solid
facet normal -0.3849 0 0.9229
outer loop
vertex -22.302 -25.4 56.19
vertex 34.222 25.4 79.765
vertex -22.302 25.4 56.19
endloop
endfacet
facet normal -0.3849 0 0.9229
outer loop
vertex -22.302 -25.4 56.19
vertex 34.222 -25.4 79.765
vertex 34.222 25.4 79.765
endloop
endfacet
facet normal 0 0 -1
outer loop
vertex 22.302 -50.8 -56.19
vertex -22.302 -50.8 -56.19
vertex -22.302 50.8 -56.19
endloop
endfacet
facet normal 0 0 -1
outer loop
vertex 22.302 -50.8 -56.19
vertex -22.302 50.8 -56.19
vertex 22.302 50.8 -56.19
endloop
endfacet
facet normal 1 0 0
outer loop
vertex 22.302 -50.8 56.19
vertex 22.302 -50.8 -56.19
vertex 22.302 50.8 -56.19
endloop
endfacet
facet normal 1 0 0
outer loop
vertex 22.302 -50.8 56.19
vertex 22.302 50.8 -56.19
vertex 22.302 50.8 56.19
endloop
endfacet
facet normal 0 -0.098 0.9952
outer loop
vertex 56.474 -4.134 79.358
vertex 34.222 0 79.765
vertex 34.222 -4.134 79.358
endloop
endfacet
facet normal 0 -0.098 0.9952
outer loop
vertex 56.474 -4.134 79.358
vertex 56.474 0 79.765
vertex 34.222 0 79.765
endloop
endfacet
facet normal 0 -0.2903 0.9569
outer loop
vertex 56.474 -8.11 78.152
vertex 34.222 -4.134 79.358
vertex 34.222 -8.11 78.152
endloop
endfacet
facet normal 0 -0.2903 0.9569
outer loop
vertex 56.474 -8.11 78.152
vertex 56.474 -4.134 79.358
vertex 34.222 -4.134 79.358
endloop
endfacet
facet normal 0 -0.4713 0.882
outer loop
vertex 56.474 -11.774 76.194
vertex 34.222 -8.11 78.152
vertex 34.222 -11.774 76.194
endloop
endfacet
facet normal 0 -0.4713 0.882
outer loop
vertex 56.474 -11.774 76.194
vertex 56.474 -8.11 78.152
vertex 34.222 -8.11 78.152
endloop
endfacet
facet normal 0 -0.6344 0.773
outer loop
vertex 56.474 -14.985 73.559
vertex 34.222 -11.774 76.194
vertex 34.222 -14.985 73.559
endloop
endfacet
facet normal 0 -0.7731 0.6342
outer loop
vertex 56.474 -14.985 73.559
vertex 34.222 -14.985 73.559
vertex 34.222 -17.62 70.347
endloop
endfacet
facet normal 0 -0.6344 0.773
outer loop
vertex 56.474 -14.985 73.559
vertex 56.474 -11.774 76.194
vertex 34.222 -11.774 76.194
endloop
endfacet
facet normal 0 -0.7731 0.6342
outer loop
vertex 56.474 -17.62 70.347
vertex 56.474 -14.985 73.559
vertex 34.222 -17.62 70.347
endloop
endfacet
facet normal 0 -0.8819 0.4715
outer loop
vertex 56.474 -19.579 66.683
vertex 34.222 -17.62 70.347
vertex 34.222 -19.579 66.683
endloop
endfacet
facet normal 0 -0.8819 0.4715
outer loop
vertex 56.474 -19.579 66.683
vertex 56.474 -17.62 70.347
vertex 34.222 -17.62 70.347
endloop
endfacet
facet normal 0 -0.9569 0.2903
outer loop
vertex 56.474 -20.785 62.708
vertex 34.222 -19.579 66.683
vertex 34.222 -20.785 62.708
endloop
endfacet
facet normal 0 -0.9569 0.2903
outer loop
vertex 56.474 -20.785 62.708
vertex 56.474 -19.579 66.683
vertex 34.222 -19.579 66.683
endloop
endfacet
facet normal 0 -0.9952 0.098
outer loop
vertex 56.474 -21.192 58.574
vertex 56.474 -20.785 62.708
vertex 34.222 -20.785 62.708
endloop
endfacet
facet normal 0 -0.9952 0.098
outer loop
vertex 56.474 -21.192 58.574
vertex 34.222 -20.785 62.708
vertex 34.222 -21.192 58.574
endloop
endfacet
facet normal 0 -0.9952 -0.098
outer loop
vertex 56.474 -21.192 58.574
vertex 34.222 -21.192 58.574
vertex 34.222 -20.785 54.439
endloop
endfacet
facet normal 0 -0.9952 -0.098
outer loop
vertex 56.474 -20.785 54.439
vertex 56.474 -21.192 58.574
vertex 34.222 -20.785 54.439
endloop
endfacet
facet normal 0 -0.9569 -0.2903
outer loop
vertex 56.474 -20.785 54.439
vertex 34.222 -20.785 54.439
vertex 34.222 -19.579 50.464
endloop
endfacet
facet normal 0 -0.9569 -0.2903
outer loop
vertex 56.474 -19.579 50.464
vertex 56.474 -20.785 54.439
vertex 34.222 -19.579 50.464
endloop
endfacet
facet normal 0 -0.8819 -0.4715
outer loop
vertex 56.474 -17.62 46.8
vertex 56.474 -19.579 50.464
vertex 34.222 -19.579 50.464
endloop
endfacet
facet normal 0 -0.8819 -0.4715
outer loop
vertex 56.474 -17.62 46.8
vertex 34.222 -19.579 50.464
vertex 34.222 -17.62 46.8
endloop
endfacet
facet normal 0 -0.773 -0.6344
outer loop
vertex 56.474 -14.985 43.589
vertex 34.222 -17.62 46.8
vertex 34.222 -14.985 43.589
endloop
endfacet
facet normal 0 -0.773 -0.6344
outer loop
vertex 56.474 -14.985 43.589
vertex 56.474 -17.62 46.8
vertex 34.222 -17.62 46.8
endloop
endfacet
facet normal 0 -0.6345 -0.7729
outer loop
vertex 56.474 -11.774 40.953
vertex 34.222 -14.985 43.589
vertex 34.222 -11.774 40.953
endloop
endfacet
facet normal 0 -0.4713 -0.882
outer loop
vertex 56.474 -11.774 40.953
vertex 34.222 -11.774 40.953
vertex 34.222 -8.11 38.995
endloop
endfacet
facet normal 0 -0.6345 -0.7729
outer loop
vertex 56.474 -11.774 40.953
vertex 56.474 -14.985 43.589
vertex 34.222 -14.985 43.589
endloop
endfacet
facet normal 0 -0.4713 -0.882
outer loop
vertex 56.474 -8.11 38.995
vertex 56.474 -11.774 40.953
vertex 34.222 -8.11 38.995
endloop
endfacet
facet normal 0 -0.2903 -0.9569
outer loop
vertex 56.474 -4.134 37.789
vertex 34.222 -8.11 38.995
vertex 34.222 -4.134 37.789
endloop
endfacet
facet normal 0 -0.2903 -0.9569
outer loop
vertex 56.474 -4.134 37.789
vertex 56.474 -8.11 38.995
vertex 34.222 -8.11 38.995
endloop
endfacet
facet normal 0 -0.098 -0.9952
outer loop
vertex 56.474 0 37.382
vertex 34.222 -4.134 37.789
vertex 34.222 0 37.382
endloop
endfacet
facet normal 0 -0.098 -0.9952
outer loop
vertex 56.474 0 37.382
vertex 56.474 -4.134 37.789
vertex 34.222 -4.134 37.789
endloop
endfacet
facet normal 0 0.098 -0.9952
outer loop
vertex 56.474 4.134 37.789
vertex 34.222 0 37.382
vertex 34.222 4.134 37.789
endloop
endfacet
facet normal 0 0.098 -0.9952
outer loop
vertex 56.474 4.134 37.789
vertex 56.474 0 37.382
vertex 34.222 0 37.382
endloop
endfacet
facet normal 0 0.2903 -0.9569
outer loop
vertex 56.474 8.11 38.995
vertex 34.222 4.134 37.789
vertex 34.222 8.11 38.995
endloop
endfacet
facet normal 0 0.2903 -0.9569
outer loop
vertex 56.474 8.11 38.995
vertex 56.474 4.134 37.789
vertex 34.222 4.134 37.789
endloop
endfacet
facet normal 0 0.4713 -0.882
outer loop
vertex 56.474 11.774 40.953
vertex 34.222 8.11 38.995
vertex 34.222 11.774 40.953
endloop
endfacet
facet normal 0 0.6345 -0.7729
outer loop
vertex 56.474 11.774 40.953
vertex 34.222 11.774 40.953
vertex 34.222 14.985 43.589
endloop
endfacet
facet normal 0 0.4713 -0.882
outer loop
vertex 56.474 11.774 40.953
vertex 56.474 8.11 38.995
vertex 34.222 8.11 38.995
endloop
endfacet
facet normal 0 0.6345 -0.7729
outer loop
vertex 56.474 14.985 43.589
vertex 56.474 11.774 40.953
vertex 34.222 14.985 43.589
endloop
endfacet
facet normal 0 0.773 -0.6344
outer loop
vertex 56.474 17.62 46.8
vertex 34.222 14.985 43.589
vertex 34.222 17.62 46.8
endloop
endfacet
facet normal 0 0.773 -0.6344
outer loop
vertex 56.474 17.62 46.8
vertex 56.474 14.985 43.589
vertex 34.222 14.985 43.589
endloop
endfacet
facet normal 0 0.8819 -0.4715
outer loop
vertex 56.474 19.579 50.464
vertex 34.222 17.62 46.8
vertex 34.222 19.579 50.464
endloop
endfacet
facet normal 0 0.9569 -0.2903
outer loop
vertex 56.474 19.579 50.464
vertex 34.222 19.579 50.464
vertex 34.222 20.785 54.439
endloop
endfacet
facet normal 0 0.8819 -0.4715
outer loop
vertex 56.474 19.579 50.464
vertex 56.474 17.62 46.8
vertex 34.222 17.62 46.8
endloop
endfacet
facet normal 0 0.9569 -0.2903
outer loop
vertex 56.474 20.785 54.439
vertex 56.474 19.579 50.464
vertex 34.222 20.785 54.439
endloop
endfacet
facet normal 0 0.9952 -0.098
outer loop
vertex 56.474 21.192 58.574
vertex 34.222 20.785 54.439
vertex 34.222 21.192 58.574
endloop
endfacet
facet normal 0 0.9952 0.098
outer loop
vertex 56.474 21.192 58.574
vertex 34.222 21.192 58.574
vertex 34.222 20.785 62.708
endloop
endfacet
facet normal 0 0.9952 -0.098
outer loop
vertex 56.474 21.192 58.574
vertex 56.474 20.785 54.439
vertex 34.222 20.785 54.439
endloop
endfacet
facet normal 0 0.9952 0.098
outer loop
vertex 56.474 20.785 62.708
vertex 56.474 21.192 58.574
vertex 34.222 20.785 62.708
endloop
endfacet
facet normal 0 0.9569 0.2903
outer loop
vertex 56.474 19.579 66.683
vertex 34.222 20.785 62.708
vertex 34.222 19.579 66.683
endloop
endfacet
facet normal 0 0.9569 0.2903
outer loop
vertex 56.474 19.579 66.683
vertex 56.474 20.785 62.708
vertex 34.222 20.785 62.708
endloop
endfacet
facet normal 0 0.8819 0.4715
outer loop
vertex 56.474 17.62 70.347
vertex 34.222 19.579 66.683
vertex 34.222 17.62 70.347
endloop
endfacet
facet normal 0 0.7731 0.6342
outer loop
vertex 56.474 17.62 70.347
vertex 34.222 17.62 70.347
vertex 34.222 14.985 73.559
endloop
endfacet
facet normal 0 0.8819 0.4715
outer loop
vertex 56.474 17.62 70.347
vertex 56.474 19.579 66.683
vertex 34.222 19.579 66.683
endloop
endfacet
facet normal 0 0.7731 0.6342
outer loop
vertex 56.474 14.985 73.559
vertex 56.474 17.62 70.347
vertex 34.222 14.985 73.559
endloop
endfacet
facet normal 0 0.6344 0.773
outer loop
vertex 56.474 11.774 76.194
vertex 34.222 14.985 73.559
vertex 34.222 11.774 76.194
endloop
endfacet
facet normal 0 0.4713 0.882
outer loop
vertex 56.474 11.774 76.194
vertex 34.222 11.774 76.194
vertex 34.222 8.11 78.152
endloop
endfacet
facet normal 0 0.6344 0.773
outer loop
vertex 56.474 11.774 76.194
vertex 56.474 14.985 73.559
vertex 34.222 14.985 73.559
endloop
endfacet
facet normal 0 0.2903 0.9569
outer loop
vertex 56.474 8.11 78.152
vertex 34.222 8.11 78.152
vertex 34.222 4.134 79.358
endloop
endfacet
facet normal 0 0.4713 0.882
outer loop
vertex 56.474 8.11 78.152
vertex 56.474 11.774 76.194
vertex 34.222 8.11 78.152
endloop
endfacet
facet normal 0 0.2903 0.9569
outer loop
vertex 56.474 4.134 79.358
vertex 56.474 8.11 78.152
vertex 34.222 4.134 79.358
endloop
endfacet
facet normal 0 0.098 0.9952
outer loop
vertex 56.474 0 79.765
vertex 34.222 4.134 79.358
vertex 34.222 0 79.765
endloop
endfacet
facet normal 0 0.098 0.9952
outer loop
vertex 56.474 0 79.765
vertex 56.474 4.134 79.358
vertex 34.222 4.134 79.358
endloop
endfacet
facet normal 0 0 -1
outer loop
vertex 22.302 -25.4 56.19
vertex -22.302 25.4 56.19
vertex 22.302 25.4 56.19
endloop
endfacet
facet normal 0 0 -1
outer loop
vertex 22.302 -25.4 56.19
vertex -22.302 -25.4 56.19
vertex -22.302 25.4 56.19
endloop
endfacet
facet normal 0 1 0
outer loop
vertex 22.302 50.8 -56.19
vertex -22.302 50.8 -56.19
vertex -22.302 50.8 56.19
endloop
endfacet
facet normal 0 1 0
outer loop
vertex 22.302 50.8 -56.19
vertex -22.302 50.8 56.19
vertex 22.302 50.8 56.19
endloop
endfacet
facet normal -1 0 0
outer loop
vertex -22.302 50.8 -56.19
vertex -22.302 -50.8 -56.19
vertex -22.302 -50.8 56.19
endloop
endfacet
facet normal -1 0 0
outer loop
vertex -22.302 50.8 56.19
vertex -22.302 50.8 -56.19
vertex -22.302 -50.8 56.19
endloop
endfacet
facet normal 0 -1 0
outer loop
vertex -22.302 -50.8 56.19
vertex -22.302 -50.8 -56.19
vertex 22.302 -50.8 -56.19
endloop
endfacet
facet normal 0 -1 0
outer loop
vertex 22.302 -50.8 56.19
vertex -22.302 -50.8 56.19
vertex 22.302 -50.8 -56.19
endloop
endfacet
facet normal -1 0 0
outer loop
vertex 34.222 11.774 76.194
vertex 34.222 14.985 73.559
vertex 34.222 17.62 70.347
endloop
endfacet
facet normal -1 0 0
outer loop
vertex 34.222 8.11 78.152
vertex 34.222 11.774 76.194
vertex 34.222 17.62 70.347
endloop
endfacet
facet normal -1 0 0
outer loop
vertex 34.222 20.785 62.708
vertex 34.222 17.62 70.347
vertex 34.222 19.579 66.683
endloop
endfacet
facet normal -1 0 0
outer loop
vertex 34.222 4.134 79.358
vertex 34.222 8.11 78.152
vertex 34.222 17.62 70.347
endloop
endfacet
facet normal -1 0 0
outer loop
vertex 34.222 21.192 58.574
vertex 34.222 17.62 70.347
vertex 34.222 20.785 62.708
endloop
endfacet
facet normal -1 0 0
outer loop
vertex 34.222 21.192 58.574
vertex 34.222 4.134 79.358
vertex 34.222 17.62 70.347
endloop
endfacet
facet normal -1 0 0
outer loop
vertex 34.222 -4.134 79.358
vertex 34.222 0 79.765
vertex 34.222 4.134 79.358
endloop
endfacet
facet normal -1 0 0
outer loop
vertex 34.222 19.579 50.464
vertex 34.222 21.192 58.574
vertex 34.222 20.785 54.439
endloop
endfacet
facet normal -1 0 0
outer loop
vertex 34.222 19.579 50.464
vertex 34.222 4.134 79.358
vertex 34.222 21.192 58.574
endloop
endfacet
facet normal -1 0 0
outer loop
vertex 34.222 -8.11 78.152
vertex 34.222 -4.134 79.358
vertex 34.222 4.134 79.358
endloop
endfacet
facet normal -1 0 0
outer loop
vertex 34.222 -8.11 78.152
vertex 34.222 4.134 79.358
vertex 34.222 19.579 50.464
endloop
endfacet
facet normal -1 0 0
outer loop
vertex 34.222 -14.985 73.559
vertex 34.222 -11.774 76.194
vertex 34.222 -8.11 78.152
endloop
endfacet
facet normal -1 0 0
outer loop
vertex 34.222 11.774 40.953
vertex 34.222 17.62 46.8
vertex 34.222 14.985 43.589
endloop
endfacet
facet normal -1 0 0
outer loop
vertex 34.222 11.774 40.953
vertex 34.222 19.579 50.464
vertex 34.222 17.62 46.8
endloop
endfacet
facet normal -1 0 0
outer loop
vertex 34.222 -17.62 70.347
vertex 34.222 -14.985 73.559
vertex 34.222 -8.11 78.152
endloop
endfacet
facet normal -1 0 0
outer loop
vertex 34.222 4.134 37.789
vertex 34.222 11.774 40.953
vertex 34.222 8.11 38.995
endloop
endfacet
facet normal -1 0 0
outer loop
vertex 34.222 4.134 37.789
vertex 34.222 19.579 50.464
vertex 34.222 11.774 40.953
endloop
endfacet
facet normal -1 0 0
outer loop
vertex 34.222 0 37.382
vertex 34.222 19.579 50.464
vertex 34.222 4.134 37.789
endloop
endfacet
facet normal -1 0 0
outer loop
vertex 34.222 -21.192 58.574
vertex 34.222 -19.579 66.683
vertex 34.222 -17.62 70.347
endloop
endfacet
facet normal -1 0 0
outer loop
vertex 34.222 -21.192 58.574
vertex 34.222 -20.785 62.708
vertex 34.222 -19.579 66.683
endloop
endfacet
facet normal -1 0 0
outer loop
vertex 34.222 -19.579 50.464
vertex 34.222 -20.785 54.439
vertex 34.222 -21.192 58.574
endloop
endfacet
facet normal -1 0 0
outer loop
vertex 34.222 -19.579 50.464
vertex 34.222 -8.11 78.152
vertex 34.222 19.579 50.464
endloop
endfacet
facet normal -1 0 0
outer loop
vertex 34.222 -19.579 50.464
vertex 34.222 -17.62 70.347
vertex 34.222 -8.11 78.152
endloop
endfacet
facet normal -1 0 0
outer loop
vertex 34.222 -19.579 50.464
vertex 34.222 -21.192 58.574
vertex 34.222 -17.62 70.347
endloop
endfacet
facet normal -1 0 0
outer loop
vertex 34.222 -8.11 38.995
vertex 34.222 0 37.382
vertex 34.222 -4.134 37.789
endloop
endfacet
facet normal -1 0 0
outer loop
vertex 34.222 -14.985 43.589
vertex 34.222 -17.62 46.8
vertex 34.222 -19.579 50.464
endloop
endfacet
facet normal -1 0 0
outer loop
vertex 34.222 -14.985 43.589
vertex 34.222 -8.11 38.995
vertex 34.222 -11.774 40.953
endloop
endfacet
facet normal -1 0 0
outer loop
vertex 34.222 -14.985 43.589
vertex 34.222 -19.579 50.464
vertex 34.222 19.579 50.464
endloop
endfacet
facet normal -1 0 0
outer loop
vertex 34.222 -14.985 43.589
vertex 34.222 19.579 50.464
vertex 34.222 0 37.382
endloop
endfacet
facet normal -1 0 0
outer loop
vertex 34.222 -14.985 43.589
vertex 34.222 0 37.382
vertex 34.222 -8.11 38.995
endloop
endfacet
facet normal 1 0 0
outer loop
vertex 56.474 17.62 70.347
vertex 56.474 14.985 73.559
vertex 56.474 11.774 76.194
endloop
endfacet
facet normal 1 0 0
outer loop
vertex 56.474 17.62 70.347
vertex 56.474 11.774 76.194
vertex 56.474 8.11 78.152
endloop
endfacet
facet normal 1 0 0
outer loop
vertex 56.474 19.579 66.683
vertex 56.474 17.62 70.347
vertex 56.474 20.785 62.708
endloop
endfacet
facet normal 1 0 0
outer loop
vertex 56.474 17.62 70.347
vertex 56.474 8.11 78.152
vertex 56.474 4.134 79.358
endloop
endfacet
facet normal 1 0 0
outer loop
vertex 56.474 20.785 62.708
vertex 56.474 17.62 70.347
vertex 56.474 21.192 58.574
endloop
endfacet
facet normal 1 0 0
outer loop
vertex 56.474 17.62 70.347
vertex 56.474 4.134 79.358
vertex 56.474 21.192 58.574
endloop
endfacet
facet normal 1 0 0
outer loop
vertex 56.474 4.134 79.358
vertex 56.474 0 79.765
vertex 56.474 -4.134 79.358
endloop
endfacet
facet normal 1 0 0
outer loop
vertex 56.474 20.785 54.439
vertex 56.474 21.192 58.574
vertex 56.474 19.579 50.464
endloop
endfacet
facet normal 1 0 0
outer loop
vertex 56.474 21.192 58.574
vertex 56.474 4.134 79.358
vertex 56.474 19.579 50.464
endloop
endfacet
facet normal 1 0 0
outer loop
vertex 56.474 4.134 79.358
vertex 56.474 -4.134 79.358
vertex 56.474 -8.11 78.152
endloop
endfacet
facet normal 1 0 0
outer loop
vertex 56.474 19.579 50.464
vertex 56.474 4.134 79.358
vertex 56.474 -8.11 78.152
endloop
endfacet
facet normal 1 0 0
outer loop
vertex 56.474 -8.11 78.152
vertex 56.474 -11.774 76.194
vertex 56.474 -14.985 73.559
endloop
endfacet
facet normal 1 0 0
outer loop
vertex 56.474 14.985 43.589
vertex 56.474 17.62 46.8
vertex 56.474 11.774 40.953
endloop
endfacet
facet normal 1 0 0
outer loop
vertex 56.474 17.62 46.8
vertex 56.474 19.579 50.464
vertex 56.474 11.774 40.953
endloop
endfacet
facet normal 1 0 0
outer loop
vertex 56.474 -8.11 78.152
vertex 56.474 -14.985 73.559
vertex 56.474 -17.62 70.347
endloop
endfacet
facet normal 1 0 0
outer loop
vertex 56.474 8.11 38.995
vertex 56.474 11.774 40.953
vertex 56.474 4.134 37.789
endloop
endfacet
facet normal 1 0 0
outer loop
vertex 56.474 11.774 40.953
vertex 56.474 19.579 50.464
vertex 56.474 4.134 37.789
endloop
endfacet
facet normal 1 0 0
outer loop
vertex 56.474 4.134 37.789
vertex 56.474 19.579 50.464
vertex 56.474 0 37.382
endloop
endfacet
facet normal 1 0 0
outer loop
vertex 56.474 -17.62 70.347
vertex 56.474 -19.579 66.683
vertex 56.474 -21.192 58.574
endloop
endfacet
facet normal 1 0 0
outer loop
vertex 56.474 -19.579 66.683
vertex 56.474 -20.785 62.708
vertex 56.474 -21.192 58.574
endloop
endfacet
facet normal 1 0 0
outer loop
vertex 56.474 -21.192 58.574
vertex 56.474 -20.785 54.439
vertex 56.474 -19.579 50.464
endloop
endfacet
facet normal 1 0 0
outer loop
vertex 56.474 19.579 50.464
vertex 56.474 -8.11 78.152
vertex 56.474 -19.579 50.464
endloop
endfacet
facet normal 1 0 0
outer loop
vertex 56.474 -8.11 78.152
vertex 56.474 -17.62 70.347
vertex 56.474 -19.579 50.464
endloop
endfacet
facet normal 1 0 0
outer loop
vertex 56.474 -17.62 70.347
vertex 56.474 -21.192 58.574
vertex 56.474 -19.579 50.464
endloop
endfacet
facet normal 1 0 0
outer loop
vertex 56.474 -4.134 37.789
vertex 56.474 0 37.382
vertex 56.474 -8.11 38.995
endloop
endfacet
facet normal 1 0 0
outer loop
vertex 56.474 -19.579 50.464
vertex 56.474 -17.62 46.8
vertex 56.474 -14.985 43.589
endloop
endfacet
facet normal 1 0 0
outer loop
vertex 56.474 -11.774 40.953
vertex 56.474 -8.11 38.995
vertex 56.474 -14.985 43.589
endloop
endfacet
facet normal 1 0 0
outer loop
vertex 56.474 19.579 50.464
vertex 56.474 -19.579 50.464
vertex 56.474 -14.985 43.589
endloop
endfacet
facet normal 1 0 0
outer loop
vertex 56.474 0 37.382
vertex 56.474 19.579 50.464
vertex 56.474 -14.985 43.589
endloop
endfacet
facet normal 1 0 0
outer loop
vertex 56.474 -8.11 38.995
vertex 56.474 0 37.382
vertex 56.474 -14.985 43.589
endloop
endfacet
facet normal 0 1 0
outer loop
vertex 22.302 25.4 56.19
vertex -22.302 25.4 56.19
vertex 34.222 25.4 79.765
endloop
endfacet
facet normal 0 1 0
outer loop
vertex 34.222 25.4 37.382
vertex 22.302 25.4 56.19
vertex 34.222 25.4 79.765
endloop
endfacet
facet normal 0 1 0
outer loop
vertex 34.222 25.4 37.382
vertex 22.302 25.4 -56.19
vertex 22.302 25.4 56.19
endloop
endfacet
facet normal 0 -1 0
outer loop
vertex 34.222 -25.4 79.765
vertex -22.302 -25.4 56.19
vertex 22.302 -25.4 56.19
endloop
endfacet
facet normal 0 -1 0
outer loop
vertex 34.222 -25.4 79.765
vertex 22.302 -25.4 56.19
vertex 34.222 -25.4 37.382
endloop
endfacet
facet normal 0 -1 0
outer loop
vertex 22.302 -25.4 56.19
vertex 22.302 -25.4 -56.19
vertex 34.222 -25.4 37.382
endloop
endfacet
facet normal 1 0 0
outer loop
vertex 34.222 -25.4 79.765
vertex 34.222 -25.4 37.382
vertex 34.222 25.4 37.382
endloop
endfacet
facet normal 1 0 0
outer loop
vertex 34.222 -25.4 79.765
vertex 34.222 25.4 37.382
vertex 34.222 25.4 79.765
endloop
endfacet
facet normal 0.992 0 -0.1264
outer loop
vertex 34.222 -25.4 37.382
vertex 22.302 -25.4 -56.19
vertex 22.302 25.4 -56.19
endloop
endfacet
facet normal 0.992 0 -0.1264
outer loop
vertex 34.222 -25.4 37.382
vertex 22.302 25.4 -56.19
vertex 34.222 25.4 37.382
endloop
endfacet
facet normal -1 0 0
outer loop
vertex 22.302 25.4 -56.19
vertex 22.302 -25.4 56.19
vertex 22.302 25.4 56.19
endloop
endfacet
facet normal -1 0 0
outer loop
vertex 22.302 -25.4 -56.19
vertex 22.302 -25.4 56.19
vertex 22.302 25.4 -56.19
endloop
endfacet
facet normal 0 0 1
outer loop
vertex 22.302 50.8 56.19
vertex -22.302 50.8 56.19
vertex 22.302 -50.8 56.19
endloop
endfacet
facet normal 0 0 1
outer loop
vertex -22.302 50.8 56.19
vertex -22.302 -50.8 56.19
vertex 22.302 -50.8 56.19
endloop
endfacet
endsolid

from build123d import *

# Parameters (mm, degrees)
F0_W     = 44.604034
F0_H     = 112.379104
F1_DEPTH = 50.8
F0_W_2   = 22.251427
F0_H_2   = 21.191836
F3_DEPTH = 25.4


with BuildPart() as f1:
    # F0 (on Front) → F1 (new body, symmetric)
    with BuildSketch(Plane.XZ):
        Rectangle(F0_W, F0_H)
    extrude(amount=F1_DEPTH, both=True)


with BuildPart() as f2:
    # F0 (on Front) → F2 (revolve)
    with BuildSketch(Plane.XZ):
        with Locations((45.348137, 69.169551)):
            Rectangle(F0_W_2, F0_H_2)
    revolve(axis=Axis((45.348138, 0, 58.573633), (1, 0, 0)))


with BuildPart() as f3:
    # F0 (on Front) → F3 (new body, symmetric)
    with BuildSketch(Plane.XZ):
        Polygon((34.222424, 79.765469), (22.302017, 56.189552), (22.302017, -56.189552), (34.222424, 37.381798), (34.222424, 58.573633), align=None)
        Polygon((-22.302017, 56.189552), (22.302017, 56.189552), (34.222424, 79.765469), align=None)
    extrude(amount=F3_DEPTH, both=True)


solid = Compound([f1.part, f2.part, f3.part])
